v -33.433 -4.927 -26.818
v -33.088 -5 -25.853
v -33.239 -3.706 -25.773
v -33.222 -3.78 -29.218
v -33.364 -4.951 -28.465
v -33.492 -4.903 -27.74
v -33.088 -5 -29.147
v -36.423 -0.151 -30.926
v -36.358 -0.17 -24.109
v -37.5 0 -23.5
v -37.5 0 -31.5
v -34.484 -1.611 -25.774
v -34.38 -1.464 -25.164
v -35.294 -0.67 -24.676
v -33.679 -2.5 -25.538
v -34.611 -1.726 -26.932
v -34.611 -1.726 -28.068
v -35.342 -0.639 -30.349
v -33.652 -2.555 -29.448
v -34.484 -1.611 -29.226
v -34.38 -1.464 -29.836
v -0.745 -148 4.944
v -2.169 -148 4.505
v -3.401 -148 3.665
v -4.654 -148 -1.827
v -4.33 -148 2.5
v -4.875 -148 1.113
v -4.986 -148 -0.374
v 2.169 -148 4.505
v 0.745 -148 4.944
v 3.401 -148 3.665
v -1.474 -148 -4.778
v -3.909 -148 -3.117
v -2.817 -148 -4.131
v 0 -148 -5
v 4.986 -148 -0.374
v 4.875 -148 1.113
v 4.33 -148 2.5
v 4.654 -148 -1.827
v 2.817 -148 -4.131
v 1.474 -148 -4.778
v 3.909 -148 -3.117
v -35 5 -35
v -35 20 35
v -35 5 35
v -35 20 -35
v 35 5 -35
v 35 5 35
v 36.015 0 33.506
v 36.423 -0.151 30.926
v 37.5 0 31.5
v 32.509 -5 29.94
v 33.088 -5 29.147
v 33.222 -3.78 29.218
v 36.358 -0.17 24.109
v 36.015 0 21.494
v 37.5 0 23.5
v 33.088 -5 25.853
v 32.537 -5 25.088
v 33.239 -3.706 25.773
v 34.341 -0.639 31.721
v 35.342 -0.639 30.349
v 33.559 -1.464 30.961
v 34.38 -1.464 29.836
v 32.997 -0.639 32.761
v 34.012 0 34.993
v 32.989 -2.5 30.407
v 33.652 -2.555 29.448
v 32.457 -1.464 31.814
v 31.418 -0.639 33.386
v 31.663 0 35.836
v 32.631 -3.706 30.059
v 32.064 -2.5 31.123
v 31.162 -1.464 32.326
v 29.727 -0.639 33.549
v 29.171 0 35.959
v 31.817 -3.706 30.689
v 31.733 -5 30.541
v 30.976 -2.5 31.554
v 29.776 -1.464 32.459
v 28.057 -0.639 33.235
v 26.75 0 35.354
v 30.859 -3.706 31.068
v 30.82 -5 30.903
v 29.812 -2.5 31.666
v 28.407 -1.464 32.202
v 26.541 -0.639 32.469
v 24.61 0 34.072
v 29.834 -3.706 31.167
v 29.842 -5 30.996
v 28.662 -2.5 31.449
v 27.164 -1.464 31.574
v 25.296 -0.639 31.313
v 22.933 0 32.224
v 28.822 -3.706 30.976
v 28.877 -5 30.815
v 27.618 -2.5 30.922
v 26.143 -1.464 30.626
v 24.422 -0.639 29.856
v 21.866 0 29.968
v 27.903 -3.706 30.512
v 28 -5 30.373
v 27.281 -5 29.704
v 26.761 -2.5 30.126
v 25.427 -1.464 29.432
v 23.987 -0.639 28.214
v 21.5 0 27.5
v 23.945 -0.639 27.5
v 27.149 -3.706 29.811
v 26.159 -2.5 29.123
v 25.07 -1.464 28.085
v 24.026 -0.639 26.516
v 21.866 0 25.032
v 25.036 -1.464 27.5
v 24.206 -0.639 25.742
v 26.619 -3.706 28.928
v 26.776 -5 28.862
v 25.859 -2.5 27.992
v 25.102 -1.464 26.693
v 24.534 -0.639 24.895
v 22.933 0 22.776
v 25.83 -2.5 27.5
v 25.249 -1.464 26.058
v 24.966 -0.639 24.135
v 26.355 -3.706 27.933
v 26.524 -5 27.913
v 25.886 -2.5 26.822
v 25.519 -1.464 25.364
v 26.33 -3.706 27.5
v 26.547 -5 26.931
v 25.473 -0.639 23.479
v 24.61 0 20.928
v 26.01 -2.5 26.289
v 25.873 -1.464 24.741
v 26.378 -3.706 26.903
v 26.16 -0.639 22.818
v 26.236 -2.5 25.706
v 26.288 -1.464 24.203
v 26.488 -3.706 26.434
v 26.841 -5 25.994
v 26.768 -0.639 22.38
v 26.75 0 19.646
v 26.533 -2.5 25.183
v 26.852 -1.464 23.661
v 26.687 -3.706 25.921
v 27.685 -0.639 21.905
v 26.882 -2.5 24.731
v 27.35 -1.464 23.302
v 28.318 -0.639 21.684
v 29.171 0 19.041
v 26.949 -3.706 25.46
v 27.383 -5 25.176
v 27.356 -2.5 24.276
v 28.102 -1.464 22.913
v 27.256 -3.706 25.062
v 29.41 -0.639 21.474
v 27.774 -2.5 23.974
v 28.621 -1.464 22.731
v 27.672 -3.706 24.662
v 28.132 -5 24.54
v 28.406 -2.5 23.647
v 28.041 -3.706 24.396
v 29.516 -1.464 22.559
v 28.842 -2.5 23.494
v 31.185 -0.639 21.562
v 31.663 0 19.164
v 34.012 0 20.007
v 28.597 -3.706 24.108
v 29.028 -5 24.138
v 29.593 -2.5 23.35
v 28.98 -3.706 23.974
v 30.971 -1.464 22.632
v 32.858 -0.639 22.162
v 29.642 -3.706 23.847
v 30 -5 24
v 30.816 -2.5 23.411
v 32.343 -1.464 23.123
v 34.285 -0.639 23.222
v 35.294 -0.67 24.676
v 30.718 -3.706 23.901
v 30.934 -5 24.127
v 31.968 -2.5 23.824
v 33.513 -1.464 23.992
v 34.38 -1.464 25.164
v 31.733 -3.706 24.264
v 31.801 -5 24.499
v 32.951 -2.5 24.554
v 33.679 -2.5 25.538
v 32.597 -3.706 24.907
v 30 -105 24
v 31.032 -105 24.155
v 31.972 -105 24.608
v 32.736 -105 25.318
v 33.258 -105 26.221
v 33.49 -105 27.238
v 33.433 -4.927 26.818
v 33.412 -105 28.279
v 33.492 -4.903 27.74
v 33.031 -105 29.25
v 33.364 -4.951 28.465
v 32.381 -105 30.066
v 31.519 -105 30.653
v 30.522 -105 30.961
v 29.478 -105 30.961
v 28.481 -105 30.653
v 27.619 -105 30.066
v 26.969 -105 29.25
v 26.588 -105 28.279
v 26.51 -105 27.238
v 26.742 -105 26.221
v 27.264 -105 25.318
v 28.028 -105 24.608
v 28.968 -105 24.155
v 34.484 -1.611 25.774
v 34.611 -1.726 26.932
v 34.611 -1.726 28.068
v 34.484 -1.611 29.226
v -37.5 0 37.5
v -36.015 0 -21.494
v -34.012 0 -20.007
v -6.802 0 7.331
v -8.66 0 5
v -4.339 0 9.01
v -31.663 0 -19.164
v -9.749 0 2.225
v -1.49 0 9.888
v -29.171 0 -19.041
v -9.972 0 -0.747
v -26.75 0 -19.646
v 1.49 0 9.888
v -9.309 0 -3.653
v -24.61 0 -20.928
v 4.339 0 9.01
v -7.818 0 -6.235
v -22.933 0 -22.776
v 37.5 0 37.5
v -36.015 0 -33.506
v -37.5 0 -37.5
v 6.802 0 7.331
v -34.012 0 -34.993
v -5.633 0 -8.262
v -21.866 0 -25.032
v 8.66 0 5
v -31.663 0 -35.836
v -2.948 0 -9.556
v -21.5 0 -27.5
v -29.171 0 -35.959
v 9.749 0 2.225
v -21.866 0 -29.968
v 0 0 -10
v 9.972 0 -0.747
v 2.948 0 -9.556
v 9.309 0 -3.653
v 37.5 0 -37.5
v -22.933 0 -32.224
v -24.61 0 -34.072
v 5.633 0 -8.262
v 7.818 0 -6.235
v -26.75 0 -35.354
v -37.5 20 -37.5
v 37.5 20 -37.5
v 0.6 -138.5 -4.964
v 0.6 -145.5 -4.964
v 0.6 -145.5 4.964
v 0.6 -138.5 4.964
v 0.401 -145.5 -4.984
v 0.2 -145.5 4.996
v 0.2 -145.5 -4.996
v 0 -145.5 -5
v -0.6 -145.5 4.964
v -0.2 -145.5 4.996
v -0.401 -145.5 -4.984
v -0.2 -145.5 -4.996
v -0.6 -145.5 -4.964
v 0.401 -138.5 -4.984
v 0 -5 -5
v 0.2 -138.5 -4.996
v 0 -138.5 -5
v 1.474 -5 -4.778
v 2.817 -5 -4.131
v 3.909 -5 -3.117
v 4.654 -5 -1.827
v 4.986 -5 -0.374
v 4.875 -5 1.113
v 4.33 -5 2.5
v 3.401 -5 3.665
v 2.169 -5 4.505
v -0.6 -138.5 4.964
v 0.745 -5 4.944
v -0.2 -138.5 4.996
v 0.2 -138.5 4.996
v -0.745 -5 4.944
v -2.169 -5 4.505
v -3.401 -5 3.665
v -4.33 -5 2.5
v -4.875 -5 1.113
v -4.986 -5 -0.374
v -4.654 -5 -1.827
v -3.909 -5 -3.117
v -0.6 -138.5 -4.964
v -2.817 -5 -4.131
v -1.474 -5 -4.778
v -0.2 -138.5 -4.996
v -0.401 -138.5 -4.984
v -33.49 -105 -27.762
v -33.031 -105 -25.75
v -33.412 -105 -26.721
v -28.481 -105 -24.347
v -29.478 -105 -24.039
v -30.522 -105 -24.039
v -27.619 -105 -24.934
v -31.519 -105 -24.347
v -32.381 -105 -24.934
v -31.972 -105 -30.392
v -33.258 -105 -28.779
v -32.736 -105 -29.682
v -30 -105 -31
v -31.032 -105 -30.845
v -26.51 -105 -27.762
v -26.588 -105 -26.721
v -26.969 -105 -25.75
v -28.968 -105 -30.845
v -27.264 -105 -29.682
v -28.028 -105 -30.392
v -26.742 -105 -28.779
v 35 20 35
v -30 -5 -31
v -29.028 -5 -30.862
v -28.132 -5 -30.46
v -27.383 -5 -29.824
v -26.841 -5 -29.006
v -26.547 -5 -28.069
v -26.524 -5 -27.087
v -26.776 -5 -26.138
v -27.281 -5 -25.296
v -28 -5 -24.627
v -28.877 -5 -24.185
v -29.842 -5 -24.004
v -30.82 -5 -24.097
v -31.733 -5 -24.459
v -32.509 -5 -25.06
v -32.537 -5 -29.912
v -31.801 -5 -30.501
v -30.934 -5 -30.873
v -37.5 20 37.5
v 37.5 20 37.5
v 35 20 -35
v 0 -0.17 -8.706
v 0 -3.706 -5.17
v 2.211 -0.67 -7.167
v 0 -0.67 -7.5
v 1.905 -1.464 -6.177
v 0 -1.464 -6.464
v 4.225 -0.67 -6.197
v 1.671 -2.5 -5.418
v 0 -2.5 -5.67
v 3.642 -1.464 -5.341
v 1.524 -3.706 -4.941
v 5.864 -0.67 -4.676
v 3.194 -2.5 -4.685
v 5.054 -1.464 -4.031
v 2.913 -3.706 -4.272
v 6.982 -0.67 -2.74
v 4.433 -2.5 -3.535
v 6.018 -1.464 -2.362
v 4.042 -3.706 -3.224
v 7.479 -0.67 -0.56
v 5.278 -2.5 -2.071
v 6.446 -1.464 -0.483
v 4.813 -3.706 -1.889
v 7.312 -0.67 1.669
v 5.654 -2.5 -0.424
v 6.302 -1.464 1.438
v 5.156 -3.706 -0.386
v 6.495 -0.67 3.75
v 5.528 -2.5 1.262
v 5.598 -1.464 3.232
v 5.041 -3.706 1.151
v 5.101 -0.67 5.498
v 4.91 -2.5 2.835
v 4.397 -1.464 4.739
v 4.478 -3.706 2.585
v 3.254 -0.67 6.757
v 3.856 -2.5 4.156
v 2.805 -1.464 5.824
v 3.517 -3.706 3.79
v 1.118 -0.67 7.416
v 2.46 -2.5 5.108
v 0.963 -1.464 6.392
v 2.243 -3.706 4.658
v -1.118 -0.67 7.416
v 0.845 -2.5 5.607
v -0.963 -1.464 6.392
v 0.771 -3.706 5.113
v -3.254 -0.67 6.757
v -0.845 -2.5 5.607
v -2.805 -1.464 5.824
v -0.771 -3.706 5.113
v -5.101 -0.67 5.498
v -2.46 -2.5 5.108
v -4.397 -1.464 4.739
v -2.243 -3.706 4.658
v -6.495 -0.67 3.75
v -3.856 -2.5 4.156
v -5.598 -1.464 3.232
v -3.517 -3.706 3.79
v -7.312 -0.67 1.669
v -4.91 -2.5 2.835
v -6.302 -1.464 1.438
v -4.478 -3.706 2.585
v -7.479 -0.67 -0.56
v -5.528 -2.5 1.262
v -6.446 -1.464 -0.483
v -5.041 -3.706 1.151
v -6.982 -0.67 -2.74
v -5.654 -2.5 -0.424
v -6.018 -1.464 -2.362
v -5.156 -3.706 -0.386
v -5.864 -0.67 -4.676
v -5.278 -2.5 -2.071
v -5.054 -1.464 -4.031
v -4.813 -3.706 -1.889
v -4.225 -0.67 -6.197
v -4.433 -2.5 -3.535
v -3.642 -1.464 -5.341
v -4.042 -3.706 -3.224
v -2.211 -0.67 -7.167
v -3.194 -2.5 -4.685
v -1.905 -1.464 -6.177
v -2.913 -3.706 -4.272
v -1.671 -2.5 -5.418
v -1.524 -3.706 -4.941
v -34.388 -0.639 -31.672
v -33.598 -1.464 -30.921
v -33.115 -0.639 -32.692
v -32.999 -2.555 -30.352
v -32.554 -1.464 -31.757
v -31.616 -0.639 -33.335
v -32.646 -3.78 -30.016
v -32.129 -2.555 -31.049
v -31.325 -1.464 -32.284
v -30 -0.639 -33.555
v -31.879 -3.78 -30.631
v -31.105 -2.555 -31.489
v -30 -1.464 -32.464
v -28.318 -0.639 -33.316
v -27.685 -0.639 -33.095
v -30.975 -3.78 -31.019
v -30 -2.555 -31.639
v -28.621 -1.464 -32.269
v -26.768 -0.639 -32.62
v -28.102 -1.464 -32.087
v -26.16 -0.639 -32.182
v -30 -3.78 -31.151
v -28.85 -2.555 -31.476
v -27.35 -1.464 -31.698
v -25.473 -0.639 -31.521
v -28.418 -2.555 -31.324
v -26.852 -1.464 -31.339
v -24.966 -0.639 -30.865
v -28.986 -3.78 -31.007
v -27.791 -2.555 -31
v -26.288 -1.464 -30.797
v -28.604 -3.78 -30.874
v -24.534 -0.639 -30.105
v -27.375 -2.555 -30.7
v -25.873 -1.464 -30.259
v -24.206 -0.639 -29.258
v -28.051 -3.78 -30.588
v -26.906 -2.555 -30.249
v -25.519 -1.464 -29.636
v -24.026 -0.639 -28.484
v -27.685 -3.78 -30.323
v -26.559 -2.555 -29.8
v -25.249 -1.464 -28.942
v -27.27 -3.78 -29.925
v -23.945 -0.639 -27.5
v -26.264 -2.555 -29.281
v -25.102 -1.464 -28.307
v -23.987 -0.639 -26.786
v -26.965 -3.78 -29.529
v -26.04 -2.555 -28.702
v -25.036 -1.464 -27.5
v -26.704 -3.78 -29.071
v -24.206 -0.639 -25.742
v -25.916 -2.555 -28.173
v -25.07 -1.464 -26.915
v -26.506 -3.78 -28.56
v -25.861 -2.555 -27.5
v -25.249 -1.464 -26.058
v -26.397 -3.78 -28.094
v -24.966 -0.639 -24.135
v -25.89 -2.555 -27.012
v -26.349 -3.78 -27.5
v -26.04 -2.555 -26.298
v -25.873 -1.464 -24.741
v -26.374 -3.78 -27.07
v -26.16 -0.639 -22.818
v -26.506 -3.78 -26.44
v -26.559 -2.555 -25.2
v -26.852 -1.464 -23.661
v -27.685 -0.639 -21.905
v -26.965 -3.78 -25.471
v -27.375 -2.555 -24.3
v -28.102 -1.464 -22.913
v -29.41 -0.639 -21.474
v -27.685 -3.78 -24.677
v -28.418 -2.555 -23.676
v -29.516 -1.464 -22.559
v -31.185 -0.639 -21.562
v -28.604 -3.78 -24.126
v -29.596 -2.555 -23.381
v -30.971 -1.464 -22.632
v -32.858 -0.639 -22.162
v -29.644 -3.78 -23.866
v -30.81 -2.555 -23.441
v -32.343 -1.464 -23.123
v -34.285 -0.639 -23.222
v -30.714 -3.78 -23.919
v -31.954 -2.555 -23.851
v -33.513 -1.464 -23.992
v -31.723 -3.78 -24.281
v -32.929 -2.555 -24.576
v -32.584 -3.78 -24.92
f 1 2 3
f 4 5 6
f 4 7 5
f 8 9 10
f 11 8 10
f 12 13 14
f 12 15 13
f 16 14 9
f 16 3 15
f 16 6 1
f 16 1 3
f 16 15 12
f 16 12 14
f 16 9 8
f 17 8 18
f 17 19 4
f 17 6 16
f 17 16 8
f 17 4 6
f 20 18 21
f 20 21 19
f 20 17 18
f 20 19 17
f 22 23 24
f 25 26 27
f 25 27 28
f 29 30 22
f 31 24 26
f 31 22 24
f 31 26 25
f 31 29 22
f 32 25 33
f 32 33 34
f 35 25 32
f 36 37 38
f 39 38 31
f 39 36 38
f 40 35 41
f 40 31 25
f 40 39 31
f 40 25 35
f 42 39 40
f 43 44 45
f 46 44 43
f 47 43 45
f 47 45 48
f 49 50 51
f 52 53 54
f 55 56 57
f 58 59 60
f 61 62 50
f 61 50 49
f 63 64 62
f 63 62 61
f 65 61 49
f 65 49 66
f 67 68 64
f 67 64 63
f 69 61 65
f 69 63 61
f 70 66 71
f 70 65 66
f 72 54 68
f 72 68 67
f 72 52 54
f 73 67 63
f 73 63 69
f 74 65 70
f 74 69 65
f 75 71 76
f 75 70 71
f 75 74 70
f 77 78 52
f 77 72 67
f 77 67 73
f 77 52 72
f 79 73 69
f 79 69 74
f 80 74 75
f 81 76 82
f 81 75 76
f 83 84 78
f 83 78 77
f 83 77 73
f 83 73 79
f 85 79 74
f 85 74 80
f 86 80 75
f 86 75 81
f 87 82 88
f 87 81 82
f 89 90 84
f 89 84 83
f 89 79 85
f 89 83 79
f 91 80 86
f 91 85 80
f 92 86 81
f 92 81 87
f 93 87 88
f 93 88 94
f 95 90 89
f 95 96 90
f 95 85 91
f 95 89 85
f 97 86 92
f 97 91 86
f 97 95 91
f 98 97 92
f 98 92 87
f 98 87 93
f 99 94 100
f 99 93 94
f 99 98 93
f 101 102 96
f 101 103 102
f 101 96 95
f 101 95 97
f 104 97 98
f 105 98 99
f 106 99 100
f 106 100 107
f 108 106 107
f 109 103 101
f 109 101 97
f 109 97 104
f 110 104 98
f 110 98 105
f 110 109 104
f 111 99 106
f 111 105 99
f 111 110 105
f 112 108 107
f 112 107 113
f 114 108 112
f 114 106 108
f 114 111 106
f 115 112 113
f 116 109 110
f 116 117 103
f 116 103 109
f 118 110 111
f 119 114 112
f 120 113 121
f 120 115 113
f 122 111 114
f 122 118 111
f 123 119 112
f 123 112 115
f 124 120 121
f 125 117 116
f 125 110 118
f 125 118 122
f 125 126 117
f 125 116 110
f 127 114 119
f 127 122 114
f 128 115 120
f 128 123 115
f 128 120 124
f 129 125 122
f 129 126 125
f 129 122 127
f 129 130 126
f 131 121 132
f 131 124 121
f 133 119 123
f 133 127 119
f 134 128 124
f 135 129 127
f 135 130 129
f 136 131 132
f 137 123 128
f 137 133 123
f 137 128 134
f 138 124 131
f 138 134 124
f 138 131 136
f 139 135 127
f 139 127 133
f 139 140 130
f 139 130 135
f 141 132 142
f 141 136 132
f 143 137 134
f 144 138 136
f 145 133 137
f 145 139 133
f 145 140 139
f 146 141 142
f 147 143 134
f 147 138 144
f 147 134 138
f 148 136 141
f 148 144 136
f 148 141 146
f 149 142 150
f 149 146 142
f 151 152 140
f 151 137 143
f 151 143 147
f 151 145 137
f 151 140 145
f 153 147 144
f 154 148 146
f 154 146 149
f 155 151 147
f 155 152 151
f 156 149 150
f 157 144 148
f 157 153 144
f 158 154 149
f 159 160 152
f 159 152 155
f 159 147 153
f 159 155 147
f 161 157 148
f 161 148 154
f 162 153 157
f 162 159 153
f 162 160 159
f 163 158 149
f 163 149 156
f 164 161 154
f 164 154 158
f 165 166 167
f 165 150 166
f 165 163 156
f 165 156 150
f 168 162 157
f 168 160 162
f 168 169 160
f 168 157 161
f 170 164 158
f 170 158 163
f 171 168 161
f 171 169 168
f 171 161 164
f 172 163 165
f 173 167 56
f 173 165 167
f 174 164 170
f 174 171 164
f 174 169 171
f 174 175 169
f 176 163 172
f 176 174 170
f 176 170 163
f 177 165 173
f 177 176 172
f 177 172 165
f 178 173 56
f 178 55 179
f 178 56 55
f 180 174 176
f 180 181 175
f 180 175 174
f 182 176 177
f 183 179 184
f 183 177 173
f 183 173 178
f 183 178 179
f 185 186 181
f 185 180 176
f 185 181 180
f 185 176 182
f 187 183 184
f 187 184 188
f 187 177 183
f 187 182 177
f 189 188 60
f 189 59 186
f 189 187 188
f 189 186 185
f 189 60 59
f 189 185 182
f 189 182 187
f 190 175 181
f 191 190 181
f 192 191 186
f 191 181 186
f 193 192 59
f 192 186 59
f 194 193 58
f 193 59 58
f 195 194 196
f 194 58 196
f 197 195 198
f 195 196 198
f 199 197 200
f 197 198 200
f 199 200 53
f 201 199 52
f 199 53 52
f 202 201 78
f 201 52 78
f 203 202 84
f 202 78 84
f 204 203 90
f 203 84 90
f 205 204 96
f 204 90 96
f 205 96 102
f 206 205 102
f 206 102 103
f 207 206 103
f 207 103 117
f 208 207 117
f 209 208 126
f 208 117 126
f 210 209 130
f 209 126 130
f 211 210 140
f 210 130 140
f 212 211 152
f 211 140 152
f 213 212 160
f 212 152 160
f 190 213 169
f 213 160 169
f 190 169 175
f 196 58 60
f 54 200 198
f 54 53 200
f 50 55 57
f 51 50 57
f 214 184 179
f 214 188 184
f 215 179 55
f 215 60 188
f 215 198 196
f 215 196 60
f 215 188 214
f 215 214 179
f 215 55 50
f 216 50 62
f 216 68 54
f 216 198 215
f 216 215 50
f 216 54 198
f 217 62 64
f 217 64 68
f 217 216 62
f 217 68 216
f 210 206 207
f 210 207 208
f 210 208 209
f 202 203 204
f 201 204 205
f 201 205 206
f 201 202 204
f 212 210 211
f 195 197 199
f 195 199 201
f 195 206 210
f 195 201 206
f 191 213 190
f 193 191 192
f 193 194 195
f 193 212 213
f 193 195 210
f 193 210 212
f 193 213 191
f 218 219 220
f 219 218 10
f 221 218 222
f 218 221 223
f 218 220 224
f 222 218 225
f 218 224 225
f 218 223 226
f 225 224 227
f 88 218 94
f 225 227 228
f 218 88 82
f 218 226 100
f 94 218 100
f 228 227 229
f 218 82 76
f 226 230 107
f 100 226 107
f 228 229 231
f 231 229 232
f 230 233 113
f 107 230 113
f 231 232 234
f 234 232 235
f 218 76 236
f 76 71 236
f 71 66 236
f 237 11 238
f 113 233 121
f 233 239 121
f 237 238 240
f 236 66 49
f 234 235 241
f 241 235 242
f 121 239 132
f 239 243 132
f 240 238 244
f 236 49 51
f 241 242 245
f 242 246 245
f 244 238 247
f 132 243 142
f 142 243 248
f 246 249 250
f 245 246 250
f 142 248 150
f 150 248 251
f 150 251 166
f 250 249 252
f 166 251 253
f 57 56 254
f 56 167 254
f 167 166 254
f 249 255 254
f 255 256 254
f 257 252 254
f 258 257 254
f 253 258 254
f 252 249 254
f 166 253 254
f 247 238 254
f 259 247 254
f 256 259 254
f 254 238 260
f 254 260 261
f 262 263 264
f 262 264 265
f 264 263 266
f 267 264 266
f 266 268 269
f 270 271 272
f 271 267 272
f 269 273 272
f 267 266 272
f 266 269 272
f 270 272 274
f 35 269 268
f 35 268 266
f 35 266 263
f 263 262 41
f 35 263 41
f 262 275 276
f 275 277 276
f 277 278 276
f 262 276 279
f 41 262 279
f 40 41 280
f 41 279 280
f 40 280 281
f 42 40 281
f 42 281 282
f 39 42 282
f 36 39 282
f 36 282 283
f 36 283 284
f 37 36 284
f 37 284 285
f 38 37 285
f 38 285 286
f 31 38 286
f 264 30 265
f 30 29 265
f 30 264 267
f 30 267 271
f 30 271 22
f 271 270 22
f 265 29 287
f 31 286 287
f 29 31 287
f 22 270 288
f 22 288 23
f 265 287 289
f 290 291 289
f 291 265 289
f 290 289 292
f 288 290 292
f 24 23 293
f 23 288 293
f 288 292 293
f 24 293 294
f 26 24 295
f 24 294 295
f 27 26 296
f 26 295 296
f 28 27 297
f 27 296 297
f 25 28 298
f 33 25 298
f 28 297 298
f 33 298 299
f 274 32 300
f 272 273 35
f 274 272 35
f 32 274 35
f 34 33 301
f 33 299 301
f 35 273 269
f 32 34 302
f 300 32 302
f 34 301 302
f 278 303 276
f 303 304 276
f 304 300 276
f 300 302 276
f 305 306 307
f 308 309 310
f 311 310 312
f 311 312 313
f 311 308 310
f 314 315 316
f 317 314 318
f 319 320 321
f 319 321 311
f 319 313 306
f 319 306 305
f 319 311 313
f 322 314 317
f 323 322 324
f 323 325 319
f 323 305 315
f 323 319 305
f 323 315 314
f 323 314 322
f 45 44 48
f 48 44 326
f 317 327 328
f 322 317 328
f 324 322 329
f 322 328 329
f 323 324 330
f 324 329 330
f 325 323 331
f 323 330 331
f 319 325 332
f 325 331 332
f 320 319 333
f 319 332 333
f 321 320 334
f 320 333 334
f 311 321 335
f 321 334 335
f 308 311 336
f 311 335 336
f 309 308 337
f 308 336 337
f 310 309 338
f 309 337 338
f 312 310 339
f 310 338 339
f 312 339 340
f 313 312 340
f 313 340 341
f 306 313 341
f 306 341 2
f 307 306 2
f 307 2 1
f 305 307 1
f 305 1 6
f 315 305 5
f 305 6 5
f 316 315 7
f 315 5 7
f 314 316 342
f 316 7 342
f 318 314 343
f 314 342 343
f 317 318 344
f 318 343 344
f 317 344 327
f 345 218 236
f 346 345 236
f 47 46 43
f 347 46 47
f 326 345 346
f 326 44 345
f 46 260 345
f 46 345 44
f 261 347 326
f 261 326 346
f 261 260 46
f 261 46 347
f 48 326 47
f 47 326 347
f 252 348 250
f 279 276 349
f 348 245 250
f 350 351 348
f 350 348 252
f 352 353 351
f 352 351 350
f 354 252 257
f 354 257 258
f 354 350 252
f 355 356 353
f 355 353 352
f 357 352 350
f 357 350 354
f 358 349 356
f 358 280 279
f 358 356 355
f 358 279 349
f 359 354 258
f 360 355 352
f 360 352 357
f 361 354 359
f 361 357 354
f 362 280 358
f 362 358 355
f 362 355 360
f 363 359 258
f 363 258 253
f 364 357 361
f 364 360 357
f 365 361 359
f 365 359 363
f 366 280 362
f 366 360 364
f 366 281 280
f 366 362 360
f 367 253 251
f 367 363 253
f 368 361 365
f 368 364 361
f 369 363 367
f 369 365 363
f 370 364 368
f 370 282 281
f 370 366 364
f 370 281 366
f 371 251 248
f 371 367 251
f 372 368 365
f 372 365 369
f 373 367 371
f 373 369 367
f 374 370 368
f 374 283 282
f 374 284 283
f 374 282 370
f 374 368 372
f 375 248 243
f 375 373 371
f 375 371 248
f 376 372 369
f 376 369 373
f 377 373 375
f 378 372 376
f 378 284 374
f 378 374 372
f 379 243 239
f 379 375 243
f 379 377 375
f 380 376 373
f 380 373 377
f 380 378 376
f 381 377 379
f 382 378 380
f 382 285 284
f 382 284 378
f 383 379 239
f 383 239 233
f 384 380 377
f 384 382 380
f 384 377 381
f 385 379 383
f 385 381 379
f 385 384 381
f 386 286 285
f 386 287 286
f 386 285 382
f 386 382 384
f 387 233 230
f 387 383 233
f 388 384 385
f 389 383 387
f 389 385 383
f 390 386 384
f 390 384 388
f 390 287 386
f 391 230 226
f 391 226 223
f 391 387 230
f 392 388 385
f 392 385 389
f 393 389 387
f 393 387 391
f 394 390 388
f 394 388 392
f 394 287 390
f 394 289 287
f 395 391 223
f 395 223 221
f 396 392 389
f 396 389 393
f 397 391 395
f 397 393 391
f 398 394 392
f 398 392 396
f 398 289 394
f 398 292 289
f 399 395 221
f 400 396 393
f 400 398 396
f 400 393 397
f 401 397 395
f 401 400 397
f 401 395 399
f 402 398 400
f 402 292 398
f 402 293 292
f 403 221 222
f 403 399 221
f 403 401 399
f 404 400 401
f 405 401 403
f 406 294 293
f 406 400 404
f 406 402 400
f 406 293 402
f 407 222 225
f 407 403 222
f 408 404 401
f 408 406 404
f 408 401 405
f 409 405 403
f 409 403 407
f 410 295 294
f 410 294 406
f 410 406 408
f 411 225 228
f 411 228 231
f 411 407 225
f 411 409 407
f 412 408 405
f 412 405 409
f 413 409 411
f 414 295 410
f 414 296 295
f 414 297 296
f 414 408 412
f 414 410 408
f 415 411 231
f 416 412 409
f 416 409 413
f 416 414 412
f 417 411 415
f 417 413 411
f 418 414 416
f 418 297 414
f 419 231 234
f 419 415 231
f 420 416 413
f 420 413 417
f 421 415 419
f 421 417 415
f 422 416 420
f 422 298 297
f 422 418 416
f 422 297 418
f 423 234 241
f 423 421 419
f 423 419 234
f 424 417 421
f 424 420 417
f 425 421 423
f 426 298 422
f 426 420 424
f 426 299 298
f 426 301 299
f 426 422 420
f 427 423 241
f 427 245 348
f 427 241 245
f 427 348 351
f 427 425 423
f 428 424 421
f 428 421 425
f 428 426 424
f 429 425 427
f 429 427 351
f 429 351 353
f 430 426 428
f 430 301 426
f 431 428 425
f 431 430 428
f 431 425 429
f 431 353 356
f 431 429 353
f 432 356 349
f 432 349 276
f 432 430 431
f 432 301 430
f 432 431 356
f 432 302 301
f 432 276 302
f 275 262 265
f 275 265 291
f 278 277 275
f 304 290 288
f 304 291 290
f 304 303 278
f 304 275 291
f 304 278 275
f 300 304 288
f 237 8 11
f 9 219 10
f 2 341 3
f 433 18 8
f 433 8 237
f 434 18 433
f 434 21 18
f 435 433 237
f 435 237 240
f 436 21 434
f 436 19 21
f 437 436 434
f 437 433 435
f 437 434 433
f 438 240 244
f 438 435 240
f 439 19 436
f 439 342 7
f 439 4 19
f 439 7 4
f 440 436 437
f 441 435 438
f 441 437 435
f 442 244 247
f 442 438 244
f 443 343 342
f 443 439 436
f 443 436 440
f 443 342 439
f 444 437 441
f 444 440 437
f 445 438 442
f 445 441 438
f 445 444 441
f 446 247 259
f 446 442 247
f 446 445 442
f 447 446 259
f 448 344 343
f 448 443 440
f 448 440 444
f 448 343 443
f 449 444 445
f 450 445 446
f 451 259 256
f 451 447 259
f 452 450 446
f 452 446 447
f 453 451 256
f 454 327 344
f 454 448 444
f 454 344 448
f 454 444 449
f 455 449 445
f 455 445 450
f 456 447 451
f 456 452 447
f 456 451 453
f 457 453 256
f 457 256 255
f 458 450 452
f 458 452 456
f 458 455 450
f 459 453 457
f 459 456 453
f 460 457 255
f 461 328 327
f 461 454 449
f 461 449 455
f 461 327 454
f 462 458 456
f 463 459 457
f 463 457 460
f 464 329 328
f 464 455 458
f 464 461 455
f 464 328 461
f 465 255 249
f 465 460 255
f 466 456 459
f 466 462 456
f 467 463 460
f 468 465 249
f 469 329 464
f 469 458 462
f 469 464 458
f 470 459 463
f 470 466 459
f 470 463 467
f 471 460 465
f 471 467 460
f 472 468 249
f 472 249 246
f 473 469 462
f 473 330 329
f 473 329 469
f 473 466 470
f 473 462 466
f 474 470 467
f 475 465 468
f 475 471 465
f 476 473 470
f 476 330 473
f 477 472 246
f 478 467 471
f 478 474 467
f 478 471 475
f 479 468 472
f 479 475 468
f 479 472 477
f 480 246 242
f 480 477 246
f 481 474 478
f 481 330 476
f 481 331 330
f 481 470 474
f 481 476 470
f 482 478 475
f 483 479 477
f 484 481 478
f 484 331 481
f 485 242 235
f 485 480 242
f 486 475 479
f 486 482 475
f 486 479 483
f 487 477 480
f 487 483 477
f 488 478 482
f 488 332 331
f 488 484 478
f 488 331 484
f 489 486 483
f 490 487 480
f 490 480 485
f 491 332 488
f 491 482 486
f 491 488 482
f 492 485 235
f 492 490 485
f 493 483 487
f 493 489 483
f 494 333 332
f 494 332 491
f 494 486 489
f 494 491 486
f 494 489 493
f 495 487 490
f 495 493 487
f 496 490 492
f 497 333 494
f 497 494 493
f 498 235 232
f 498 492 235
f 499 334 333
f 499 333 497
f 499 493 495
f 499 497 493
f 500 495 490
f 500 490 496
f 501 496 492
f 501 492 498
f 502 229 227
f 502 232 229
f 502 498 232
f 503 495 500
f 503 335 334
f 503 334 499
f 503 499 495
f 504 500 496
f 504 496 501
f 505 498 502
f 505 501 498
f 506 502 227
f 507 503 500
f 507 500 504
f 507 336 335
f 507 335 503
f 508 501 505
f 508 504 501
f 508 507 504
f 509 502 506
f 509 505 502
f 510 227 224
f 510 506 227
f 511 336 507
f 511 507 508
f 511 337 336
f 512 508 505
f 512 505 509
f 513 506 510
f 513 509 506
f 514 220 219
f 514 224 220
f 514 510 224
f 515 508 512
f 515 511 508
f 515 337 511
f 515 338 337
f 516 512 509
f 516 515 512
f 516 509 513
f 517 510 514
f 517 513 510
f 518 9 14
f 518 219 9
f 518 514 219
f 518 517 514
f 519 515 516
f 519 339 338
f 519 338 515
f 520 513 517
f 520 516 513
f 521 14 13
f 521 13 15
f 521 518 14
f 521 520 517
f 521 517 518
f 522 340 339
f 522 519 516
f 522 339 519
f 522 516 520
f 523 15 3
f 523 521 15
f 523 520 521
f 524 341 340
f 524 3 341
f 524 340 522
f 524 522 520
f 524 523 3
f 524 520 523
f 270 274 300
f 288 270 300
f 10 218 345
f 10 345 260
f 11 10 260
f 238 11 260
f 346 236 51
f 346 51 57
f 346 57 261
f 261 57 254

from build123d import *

# Parameters (mm, degrees)
ESBO_O1_W                = 75
ESBO_O1_H                = 75
RESSALTO_EXTRUS_O1_DEPTH = 20
ESBO_O2_W                = 70
ESBO_O2_H                = 70
CORTE_EXTRUS_O1_DEPTH    = 15
ESBO_O3_R                = 5
RESSALTO_EXTRUS_O2_DEPTH = 148
ESBO_O5_W                = 1.2
ESBO_O5_H                = 7
CORTE_EXTRUS_O2_DEPTH    = 70
ESBO_O7_R                = 3.5
RESSALTO_EXTRUS_O3_DEPTH = 105
FILETE2_R                = 5
FILETE3_R                = 5
FILETE4_R                = 5


with BuildPart() as part:
    # Esboço1 → Ressalto-extrusão1 (new body)
    with BuildSketch(Plane(origin=(0, 0, 0), x_dir=(1, 0, 0), z_dir=(0, 1, 0))):
        Rectangle(ESBO_O1_W, ESBO_O1_H)
    extrude(amount=RESSALTO_EXTRUS_O1_DEPTH)

    # Esboço2 → Corte-extrusão1 (cut)
    with BuildSketch(Plane(origin=(0, 20, 0), x_dir=(1, 0, 0), z_dir=(0, 1, 0))):
        Rectangle(ESBO_O2_W, ESBO_O2_H)
    extrude(amount=-CORTE_EXTRUS_O1_DEPTH, mode=Mode.SUBTRACT)

    # Esboço3 → Ressalto-extrusão2 (add)
    with BuildSketch(Plane(origin=(0, 0, 0), x_dir=(-1, 0, 0), z_dir=(0, -1, 0))):
        with Locations(Location((0, 0, 0), (0, 0, 90))):
            Circle(ESBO_O3_R)
    extrude(amount=RESSALTO_EXTRUS_O2_DEPTH)

    # Esboço5 → Corte-extrusão2 (cut)
    with BuildSketch(Plane(origin=(0, 0, -37.5), x_dir=(-1, 0, 0), z_dir=(0, 0, -1))):
        with Locations((0, -142)):
            Rectangle(ESBO_O5_W, ESBO_O5_H)
    extrude(amount=-CORTE_EXTRUS_O2_DEPTH, mode=Mode.SUBTRACT)

    # Esboço7 → Ressalto-extrusão3 (add)
    with BuildSketch(Plane.XZ):
        with Locations(Location((30, 27.5, 0), (0, 0, 270))):
            Circle(ESBO_O7_R)
        with Locations(Location((-30, -27.5, 0), (0, 0, 270))):
            Circle(ESBO_O7_R)
    extrude(amount=RESSALTO_EXTRUS_O3_DEPTH)

    # Filete2
    filete2_edges = [part.edges().sort_by_distance(p)[0] for p in [
        (-30, 0, -24),
    ]]
    fillet(filete2_edges, radius=FILETE2_R)

    # Filete3
    filete3_edges = [part.edges().sort_by_distance(p)[0] for p in [
        (30, 0, 31),
    ]]
    fillet(filete3_edges, radius=FILETE3_R)

    # Filete4
    filete4_edges = [part.edges().sort_by_distance(p)[0] for p in [
        (0, 0, 5),
    ]]
    fillet(filete4_edges, radius=FILETE4_R)


solid = part.part
